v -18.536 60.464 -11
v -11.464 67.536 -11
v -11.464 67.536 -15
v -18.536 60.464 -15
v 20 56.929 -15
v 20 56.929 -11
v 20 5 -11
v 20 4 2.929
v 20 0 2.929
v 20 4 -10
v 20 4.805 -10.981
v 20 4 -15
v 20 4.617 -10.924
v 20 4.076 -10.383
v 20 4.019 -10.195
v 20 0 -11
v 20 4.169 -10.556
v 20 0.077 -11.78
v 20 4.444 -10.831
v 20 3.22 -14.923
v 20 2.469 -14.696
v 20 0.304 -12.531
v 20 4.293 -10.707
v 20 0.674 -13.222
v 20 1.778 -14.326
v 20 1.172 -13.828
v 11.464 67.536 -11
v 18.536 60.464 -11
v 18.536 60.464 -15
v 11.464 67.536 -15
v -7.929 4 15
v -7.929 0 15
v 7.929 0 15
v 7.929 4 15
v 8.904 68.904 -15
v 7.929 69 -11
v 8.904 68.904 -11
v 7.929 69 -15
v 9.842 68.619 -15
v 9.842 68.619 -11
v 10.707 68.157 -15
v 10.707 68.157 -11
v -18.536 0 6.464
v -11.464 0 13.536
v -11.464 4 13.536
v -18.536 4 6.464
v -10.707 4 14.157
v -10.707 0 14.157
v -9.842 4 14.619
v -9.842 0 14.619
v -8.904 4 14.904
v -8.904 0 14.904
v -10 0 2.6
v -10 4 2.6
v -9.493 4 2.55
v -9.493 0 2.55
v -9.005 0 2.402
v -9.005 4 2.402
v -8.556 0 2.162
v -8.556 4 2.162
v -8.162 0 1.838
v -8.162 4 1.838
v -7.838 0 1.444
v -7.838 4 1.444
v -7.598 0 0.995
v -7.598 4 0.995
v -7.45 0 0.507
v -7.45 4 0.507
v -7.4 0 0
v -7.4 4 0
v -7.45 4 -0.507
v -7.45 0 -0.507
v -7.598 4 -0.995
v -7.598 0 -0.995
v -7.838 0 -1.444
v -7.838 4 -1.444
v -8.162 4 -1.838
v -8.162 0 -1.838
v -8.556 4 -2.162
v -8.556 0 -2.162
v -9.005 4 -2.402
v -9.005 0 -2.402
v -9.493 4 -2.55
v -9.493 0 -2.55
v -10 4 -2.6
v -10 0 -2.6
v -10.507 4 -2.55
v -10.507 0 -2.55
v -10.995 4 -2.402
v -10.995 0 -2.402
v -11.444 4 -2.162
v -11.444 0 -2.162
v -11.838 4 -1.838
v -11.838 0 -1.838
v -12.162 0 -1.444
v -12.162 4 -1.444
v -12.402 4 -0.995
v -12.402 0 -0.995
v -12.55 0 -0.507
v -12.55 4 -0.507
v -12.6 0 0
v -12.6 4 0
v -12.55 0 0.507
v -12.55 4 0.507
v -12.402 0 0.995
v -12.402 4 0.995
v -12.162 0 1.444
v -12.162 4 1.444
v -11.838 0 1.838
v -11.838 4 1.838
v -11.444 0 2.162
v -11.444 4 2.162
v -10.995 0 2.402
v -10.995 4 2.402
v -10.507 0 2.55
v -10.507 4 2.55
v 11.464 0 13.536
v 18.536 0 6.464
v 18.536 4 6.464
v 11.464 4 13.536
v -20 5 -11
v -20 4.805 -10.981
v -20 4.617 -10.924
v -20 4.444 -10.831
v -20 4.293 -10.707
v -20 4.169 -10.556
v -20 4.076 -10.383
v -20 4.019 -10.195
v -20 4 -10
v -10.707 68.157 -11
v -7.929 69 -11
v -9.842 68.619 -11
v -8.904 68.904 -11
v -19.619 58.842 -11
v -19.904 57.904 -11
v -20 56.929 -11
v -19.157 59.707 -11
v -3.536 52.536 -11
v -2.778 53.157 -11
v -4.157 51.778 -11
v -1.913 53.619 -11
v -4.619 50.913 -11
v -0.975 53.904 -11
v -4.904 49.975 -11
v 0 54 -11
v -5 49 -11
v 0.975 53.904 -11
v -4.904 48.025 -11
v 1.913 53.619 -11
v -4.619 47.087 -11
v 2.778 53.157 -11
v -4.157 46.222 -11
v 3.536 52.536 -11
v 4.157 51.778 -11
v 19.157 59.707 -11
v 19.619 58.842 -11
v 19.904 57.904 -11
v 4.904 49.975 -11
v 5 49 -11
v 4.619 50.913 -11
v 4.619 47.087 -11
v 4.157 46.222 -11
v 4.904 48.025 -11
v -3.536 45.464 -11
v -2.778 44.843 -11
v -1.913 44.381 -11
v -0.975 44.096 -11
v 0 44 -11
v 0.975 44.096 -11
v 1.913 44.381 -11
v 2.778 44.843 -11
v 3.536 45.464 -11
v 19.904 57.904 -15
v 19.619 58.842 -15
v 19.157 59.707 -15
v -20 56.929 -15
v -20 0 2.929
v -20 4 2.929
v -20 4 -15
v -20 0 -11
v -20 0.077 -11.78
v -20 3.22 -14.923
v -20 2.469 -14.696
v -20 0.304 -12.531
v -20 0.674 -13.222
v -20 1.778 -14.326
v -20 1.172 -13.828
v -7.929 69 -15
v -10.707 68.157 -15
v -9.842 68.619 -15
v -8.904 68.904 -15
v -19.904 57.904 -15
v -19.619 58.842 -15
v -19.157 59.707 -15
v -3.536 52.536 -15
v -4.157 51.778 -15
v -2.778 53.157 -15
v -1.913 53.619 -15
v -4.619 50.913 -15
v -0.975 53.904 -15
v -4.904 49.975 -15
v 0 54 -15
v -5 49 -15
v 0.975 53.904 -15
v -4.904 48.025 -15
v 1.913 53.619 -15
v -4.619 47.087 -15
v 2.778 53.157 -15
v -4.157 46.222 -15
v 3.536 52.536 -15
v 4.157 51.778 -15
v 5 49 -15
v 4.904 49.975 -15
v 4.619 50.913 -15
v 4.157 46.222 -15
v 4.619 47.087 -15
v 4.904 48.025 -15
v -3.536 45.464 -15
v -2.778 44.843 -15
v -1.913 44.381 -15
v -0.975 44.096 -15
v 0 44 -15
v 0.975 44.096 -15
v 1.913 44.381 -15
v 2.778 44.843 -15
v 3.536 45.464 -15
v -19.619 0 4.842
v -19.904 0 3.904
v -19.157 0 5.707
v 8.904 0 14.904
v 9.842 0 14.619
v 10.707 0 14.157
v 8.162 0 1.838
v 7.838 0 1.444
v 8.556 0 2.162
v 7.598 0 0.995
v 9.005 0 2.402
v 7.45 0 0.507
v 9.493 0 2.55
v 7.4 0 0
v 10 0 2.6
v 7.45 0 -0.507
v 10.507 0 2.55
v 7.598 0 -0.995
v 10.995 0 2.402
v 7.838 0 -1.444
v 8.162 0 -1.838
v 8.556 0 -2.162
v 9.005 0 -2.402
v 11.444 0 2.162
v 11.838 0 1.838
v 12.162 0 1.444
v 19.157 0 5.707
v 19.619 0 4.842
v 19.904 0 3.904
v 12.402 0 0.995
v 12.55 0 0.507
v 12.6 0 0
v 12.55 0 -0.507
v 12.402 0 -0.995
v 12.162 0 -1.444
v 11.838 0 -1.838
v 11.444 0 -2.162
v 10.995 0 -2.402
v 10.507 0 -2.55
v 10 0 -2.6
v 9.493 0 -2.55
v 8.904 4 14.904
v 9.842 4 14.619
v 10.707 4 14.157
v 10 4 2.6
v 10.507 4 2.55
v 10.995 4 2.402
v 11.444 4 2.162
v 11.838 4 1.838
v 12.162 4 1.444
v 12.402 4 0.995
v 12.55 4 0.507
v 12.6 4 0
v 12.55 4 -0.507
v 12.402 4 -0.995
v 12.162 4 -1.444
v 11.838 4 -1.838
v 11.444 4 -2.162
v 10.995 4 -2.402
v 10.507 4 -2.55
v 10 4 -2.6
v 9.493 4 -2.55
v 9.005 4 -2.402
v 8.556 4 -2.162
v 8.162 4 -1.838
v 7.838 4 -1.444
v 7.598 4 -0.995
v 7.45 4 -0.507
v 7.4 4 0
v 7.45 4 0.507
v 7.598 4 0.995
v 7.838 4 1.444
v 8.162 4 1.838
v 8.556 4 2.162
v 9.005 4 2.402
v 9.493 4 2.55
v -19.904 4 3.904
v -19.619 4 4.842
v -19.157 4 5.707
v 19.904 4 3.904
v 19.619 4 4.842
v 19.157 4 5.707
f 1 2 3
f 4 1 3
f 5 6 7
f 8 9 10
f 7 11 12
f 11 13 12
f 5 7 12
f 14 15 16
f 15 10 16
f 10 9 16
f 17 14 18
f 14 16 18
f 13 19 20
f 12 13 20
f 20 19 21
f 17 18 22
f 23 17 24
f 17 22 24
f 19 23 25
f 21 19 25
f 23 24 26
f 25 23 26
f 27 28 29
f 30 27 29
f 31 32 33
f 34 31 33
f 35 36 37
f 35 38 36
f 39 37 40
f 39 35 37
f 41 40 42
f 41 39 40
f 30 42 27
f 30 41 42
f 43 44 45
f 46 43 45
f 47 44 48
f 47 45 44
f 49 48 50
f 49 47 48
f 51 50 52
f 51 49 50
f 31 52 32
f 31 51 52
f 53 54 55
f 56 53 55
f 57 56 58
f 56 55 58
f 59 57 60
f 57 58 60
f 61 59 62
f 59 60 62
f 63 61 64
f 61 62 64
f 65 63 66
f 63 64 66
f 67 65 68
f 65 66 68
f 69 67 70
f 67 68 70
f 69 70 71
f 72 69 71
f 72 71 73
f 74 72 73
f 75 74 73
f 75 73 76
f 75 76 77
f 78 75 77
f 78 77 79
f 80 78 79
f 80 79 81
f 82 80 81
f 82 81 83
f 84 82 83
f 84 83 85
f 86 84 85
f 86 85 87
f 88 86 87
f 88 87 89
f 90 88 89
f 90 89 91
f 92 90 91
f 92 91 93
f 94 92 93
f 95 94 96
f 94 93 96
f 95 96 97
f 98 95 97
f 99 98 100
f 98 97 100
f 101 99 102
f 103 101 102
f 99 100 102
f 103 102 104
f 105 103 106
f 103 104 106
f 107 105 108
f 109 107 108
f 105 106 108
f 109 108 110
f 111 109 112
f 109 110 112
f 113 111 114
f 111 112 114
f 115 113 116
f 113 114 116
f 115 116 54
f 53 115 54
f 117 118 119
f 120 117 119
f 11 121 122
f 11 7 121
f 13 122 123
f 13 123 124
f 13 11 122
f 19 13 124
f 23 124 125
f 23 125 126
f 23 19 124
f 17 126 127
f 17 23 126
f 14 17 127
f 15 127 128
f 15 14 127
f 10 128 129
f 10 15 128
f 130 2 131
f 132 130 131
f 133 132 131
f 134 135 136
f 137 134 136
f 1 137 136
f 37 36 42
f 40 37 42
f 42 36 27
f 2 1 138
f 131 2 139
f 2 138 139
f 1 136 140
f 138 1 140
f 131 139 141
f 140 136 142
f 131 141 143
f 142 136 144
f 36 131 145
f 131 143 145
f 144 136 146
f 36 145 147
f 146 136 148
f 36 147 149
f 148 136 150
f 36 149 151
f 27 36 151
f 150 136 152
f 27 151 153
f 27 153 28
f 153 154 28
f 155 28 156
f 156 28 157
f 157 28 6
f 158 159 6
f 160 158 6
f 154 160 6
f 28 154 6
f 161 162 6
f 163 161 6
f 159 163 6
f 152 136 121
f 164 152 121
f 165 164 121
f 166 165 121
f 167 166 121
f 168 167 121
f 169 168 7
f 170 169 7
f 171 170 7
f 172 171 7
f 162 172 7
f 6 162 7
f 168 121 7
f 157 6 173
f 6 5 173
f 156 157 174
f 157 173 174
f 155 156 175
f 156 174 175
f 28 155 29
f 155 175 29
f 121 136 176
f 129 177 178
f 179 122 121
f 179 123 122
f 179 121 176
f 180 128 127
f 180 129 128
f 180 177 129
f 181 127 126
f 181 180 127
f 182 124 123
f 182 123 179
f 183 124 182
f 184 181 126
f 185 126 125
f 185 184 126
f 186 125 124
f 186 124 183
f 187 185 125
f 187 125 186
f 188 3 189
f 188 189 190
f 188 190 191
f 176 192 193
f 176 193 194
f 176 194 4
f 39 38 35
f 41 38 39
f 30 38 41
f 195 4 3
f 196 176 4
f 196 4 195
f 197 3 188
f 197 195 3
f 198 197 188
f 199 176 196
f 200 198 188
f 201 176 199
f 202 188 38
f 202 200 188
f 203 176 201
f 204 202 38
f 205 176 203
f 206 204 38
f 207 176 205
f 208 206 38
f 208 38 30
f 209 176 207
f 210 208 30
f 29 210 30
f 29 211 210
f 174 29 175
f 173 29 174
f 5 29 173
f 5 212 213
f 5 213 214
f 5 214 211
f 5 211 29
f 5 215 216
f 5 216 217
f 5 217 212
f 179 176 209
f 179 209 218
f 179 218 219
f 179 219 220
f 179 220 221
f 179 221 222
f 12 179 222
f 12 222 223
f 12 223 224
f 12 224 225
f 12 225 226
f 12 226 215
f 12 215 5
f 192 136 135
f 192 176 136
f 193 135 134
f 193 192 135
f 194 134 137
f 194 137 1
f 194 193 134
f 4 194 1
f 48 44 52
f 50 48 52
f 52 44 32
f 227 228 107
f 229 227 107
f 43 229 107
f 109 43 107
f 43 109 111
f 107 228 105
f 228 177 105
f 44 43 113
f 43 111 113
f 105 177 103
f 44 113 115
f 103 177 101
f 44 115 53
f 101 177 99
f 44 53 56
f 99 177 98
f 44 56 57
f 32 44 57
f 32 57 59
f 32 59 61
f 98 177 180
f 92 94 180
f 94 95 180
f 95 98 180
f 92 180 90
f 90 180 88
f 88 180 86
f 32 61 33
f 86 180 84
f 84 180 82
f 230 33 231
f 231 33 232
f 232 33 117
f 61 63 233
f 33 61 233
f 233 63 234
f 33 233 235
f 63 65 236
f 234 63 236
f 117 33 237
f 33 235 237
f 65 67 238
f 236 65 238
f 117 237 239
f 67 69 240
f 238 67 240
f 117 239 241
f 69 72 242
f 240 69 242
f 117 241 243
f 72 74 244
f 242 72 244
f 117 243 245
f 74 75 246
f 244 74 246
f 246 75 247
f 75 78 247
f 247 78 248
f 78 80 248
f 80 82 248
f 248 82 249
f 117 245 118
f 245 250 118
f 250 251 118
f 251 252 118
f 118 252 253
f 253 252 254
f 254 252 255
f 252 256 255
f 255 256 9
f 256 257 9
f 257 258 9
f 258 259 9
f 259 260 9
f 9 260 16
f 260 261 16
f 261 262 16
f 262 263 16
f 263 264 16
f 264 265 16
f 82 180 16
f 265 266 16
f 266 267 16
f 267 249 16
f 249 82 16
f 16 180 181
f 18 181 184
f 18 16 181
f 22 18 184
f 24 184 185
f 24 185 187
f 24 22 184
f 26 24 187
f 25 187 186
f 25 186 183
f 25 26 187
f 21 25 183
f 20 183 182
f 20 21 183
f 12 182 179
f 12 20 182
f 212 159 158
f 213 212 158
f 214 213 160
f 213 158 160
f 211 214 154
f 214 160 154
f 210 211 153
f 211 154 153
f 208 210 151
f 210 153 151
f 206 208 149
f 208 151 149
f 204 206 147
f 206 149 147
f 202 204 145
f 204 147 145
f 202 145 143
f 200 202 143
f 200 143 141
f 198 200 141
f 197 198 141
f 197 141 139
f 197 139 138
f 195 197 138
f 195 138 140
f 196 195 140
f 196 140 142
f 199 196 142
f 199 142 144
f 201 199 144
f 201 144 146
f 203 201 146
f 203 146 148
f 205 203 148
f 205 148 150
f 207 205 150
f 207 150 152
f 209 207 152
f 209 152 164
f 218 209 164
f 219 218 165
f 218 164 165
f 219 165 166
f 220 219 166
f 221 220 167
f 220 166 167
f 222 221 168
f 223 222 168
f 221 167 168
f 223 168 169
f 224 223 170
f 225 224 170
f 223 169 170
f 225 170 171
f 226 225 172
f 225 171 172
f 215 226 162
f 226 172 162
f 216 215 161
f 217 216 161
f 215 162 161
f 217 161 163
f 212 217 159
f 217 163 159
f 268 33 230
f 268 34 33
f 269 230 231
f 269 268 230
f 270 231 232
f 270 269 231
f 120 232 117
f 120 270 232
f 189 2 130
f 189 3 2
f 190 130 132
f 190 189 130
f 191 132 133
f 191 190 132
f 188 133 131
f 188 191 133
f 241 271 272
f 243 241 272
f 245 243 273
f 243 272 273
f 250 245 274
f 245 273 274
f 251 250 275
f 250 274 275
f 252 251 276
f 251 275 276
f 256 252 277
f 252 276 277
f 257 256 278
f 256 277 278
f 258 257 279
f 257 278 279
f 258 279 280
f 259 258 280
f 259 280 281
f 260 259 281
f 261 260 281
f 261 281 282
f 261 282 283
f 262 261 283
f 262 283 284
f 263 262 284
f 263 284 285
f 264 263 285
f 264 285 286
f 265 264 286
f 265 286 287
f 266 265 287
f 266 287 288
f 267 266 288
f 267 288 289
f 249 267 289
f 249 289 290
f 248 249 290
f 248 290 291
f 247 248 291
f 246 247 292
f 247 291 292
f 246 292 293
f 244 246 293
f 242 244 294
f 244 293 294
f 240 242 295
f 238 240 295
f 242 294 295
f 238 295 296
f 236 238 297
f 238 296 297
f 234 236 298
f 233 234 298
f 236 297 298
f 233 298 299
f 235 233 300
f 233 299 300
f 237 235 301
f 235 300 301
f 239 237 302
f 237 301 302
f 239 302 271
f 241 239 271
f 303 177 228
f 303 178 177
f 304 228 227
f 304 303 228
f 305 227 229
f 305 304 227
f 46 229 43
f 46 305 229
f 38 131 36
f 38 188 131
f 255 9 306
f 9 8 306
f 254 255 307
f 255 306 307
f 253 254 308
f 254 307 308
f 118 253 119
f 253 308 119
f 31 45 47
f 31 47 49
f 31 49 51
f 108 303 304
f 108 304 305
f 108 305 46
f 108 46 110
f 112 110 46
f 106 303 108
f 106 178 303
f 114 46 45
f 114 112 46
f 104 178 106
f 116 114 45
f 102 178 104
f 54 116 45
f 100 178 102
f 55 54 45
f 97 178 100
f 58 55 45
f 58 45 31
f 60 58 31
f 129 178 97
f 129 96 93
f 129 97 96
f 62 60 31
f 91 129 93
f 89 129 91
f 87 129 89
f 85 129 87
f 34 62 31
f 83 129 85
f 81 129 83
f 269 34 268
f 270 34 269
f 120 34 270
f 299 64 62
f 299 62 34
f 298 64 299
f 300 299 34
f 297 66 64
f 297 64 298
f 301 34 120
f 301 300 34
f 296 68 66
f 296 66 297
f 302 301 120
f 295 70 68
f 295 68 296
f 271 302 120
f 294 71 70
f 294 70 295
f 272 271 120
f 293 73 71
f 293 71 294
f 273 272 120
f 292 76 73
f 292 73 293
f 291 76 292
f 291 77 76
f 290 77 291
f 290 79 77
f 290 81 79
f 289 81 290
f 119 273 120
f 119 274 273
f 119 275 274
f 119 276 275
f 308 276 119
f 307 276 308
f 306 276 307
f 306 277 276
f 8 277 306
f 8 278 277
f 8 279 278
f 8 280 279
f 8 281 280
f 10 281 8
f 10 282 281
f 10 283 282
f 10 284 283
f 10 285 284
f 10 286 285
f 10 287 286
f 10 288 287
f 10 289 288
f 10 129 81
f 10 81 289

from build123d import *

# Parameters (mm, degrees)
SKETCH_1_W             = 40
SKETCH_1_H             = 30
EXTRUDE_1_DEPTH        = 4
SKETCH_3_W             = 40
SKETCH_3_H             = 4
EXTRUDE_2_DEPTH        = 65
FILLET_1_R             = 4
SKETCH_4_R             = 2.6
CUT_EXTRUDE_1_DEPTH    = 70.641941386
PATTERN_LINEAR_1_COUNT = 2
PATTERN_LINEAR_1_PITCH = 20
SKETCH_5_R             = 5
CUT_EXTRUDE_2_DEPTH    = 77.40026178
CHAMFER_1_SIZE         = 10
FILLET_2_R             = 5
FILLET_3_R             = 1


with BuildPart() as part:
    # 草圖1 → 填料-伸長1 (new body)
    with BuildSketch(Plane(origin=(0, 0, 0), x_dir=(1, 0, 0), z_dir=(0, 1, 0))):
        Rectangle(SKETCH_1_W, SKETCH_1_H)
    extrude(amount=EXTRUDE_1_DEPTH)

    # 草圖3 → 填料-伸長2 (add)
    with BuildSketch(Plane(origin=(0, 4, 0), x_dir=(1, 0, 0), z_dir=(0, 1, 0))):
        with Locations((0, 13)):
            Rectangle(SKETCH_3_W, SKETCH_3_H)
    extrude(amount=EXTRUDE_2_DEPTH)

    # 圓角1
    fillet_1_edges = [part.edges().sort_by_distance(p)[0] for p in [
        (0, 0, -15),
    ]]
    fillet(fillet_1_edges, radius=FILLET_1_R)

    # 草圖4 → 除料-伸長1 (cut, through all)
    with BuildSketch(Plane(origin=(0, 4, 0), x_dir=(1, 0, 0), z_dir=(0, 1, 0))):
        with Locations(Location((-10, 0, 0), (0, 0, 270))):
            Circle(SKETCH_4_R)
    cut_extrude_1 = extrude(amount=-CUT_EXTRUDE_1_DEPTH, mode=Mode.SUBTRACT)

    # 直線複製排列1: 除料-伸長1 ×2
    with Locations(*[(i * PATTERN_LINEAR_1_PITCH, 0, 0) for i in range(1, PATTERN_LINEAR_1_COUNT)]):
        add(cut_extrude_1, mode=Mode.SUBTRACT)

    # 草圖5 → 除料-伸長2 (cut, through all)
    with BuildSketch(Plane.XY.offset(-11)):
        with Locations((0, 49)):
            Circle(SKETCH_5_R)
    extrude(amount=-CUT_EXTRUDE_2_DEPTH, mode=Mode.SUBTRACT)

    # 導角1
    chamfer_1_edges = [part.edges().sort_by_distance(p)[0] for p in [
        (-20, 69, -13),
        (20, 69, -13),
        (20, 2, 15),
        (-20, 2, 15),
    ]]
    chamfer(chamfer_1_edges, length=CHAMFER_1_SIZE)

    # 圓角2
    fillet_2_edges = [part.edges().sort_by_distance(p)[0] for p in [
        (-10, 69, -13),
        (10, 69, -13),
        (20, 2, 5),
        (20, 59, -13),
        (-20, 2, 5),
        (-20, 59, -13),
        (10, 2, 15),
        (-10, 2, 15),
    ]]
    fillet(fillet_2_edges, radius=FILLET_2_R)

    # 圓角3
    fillet_3_edges = [part.edges().sort_by_distance(p)[0] for p in [
        (0, 4, -11),
    ]]
    fillet(fillet_3_edges, radius=FILLET_3_R)


solid = part.part
